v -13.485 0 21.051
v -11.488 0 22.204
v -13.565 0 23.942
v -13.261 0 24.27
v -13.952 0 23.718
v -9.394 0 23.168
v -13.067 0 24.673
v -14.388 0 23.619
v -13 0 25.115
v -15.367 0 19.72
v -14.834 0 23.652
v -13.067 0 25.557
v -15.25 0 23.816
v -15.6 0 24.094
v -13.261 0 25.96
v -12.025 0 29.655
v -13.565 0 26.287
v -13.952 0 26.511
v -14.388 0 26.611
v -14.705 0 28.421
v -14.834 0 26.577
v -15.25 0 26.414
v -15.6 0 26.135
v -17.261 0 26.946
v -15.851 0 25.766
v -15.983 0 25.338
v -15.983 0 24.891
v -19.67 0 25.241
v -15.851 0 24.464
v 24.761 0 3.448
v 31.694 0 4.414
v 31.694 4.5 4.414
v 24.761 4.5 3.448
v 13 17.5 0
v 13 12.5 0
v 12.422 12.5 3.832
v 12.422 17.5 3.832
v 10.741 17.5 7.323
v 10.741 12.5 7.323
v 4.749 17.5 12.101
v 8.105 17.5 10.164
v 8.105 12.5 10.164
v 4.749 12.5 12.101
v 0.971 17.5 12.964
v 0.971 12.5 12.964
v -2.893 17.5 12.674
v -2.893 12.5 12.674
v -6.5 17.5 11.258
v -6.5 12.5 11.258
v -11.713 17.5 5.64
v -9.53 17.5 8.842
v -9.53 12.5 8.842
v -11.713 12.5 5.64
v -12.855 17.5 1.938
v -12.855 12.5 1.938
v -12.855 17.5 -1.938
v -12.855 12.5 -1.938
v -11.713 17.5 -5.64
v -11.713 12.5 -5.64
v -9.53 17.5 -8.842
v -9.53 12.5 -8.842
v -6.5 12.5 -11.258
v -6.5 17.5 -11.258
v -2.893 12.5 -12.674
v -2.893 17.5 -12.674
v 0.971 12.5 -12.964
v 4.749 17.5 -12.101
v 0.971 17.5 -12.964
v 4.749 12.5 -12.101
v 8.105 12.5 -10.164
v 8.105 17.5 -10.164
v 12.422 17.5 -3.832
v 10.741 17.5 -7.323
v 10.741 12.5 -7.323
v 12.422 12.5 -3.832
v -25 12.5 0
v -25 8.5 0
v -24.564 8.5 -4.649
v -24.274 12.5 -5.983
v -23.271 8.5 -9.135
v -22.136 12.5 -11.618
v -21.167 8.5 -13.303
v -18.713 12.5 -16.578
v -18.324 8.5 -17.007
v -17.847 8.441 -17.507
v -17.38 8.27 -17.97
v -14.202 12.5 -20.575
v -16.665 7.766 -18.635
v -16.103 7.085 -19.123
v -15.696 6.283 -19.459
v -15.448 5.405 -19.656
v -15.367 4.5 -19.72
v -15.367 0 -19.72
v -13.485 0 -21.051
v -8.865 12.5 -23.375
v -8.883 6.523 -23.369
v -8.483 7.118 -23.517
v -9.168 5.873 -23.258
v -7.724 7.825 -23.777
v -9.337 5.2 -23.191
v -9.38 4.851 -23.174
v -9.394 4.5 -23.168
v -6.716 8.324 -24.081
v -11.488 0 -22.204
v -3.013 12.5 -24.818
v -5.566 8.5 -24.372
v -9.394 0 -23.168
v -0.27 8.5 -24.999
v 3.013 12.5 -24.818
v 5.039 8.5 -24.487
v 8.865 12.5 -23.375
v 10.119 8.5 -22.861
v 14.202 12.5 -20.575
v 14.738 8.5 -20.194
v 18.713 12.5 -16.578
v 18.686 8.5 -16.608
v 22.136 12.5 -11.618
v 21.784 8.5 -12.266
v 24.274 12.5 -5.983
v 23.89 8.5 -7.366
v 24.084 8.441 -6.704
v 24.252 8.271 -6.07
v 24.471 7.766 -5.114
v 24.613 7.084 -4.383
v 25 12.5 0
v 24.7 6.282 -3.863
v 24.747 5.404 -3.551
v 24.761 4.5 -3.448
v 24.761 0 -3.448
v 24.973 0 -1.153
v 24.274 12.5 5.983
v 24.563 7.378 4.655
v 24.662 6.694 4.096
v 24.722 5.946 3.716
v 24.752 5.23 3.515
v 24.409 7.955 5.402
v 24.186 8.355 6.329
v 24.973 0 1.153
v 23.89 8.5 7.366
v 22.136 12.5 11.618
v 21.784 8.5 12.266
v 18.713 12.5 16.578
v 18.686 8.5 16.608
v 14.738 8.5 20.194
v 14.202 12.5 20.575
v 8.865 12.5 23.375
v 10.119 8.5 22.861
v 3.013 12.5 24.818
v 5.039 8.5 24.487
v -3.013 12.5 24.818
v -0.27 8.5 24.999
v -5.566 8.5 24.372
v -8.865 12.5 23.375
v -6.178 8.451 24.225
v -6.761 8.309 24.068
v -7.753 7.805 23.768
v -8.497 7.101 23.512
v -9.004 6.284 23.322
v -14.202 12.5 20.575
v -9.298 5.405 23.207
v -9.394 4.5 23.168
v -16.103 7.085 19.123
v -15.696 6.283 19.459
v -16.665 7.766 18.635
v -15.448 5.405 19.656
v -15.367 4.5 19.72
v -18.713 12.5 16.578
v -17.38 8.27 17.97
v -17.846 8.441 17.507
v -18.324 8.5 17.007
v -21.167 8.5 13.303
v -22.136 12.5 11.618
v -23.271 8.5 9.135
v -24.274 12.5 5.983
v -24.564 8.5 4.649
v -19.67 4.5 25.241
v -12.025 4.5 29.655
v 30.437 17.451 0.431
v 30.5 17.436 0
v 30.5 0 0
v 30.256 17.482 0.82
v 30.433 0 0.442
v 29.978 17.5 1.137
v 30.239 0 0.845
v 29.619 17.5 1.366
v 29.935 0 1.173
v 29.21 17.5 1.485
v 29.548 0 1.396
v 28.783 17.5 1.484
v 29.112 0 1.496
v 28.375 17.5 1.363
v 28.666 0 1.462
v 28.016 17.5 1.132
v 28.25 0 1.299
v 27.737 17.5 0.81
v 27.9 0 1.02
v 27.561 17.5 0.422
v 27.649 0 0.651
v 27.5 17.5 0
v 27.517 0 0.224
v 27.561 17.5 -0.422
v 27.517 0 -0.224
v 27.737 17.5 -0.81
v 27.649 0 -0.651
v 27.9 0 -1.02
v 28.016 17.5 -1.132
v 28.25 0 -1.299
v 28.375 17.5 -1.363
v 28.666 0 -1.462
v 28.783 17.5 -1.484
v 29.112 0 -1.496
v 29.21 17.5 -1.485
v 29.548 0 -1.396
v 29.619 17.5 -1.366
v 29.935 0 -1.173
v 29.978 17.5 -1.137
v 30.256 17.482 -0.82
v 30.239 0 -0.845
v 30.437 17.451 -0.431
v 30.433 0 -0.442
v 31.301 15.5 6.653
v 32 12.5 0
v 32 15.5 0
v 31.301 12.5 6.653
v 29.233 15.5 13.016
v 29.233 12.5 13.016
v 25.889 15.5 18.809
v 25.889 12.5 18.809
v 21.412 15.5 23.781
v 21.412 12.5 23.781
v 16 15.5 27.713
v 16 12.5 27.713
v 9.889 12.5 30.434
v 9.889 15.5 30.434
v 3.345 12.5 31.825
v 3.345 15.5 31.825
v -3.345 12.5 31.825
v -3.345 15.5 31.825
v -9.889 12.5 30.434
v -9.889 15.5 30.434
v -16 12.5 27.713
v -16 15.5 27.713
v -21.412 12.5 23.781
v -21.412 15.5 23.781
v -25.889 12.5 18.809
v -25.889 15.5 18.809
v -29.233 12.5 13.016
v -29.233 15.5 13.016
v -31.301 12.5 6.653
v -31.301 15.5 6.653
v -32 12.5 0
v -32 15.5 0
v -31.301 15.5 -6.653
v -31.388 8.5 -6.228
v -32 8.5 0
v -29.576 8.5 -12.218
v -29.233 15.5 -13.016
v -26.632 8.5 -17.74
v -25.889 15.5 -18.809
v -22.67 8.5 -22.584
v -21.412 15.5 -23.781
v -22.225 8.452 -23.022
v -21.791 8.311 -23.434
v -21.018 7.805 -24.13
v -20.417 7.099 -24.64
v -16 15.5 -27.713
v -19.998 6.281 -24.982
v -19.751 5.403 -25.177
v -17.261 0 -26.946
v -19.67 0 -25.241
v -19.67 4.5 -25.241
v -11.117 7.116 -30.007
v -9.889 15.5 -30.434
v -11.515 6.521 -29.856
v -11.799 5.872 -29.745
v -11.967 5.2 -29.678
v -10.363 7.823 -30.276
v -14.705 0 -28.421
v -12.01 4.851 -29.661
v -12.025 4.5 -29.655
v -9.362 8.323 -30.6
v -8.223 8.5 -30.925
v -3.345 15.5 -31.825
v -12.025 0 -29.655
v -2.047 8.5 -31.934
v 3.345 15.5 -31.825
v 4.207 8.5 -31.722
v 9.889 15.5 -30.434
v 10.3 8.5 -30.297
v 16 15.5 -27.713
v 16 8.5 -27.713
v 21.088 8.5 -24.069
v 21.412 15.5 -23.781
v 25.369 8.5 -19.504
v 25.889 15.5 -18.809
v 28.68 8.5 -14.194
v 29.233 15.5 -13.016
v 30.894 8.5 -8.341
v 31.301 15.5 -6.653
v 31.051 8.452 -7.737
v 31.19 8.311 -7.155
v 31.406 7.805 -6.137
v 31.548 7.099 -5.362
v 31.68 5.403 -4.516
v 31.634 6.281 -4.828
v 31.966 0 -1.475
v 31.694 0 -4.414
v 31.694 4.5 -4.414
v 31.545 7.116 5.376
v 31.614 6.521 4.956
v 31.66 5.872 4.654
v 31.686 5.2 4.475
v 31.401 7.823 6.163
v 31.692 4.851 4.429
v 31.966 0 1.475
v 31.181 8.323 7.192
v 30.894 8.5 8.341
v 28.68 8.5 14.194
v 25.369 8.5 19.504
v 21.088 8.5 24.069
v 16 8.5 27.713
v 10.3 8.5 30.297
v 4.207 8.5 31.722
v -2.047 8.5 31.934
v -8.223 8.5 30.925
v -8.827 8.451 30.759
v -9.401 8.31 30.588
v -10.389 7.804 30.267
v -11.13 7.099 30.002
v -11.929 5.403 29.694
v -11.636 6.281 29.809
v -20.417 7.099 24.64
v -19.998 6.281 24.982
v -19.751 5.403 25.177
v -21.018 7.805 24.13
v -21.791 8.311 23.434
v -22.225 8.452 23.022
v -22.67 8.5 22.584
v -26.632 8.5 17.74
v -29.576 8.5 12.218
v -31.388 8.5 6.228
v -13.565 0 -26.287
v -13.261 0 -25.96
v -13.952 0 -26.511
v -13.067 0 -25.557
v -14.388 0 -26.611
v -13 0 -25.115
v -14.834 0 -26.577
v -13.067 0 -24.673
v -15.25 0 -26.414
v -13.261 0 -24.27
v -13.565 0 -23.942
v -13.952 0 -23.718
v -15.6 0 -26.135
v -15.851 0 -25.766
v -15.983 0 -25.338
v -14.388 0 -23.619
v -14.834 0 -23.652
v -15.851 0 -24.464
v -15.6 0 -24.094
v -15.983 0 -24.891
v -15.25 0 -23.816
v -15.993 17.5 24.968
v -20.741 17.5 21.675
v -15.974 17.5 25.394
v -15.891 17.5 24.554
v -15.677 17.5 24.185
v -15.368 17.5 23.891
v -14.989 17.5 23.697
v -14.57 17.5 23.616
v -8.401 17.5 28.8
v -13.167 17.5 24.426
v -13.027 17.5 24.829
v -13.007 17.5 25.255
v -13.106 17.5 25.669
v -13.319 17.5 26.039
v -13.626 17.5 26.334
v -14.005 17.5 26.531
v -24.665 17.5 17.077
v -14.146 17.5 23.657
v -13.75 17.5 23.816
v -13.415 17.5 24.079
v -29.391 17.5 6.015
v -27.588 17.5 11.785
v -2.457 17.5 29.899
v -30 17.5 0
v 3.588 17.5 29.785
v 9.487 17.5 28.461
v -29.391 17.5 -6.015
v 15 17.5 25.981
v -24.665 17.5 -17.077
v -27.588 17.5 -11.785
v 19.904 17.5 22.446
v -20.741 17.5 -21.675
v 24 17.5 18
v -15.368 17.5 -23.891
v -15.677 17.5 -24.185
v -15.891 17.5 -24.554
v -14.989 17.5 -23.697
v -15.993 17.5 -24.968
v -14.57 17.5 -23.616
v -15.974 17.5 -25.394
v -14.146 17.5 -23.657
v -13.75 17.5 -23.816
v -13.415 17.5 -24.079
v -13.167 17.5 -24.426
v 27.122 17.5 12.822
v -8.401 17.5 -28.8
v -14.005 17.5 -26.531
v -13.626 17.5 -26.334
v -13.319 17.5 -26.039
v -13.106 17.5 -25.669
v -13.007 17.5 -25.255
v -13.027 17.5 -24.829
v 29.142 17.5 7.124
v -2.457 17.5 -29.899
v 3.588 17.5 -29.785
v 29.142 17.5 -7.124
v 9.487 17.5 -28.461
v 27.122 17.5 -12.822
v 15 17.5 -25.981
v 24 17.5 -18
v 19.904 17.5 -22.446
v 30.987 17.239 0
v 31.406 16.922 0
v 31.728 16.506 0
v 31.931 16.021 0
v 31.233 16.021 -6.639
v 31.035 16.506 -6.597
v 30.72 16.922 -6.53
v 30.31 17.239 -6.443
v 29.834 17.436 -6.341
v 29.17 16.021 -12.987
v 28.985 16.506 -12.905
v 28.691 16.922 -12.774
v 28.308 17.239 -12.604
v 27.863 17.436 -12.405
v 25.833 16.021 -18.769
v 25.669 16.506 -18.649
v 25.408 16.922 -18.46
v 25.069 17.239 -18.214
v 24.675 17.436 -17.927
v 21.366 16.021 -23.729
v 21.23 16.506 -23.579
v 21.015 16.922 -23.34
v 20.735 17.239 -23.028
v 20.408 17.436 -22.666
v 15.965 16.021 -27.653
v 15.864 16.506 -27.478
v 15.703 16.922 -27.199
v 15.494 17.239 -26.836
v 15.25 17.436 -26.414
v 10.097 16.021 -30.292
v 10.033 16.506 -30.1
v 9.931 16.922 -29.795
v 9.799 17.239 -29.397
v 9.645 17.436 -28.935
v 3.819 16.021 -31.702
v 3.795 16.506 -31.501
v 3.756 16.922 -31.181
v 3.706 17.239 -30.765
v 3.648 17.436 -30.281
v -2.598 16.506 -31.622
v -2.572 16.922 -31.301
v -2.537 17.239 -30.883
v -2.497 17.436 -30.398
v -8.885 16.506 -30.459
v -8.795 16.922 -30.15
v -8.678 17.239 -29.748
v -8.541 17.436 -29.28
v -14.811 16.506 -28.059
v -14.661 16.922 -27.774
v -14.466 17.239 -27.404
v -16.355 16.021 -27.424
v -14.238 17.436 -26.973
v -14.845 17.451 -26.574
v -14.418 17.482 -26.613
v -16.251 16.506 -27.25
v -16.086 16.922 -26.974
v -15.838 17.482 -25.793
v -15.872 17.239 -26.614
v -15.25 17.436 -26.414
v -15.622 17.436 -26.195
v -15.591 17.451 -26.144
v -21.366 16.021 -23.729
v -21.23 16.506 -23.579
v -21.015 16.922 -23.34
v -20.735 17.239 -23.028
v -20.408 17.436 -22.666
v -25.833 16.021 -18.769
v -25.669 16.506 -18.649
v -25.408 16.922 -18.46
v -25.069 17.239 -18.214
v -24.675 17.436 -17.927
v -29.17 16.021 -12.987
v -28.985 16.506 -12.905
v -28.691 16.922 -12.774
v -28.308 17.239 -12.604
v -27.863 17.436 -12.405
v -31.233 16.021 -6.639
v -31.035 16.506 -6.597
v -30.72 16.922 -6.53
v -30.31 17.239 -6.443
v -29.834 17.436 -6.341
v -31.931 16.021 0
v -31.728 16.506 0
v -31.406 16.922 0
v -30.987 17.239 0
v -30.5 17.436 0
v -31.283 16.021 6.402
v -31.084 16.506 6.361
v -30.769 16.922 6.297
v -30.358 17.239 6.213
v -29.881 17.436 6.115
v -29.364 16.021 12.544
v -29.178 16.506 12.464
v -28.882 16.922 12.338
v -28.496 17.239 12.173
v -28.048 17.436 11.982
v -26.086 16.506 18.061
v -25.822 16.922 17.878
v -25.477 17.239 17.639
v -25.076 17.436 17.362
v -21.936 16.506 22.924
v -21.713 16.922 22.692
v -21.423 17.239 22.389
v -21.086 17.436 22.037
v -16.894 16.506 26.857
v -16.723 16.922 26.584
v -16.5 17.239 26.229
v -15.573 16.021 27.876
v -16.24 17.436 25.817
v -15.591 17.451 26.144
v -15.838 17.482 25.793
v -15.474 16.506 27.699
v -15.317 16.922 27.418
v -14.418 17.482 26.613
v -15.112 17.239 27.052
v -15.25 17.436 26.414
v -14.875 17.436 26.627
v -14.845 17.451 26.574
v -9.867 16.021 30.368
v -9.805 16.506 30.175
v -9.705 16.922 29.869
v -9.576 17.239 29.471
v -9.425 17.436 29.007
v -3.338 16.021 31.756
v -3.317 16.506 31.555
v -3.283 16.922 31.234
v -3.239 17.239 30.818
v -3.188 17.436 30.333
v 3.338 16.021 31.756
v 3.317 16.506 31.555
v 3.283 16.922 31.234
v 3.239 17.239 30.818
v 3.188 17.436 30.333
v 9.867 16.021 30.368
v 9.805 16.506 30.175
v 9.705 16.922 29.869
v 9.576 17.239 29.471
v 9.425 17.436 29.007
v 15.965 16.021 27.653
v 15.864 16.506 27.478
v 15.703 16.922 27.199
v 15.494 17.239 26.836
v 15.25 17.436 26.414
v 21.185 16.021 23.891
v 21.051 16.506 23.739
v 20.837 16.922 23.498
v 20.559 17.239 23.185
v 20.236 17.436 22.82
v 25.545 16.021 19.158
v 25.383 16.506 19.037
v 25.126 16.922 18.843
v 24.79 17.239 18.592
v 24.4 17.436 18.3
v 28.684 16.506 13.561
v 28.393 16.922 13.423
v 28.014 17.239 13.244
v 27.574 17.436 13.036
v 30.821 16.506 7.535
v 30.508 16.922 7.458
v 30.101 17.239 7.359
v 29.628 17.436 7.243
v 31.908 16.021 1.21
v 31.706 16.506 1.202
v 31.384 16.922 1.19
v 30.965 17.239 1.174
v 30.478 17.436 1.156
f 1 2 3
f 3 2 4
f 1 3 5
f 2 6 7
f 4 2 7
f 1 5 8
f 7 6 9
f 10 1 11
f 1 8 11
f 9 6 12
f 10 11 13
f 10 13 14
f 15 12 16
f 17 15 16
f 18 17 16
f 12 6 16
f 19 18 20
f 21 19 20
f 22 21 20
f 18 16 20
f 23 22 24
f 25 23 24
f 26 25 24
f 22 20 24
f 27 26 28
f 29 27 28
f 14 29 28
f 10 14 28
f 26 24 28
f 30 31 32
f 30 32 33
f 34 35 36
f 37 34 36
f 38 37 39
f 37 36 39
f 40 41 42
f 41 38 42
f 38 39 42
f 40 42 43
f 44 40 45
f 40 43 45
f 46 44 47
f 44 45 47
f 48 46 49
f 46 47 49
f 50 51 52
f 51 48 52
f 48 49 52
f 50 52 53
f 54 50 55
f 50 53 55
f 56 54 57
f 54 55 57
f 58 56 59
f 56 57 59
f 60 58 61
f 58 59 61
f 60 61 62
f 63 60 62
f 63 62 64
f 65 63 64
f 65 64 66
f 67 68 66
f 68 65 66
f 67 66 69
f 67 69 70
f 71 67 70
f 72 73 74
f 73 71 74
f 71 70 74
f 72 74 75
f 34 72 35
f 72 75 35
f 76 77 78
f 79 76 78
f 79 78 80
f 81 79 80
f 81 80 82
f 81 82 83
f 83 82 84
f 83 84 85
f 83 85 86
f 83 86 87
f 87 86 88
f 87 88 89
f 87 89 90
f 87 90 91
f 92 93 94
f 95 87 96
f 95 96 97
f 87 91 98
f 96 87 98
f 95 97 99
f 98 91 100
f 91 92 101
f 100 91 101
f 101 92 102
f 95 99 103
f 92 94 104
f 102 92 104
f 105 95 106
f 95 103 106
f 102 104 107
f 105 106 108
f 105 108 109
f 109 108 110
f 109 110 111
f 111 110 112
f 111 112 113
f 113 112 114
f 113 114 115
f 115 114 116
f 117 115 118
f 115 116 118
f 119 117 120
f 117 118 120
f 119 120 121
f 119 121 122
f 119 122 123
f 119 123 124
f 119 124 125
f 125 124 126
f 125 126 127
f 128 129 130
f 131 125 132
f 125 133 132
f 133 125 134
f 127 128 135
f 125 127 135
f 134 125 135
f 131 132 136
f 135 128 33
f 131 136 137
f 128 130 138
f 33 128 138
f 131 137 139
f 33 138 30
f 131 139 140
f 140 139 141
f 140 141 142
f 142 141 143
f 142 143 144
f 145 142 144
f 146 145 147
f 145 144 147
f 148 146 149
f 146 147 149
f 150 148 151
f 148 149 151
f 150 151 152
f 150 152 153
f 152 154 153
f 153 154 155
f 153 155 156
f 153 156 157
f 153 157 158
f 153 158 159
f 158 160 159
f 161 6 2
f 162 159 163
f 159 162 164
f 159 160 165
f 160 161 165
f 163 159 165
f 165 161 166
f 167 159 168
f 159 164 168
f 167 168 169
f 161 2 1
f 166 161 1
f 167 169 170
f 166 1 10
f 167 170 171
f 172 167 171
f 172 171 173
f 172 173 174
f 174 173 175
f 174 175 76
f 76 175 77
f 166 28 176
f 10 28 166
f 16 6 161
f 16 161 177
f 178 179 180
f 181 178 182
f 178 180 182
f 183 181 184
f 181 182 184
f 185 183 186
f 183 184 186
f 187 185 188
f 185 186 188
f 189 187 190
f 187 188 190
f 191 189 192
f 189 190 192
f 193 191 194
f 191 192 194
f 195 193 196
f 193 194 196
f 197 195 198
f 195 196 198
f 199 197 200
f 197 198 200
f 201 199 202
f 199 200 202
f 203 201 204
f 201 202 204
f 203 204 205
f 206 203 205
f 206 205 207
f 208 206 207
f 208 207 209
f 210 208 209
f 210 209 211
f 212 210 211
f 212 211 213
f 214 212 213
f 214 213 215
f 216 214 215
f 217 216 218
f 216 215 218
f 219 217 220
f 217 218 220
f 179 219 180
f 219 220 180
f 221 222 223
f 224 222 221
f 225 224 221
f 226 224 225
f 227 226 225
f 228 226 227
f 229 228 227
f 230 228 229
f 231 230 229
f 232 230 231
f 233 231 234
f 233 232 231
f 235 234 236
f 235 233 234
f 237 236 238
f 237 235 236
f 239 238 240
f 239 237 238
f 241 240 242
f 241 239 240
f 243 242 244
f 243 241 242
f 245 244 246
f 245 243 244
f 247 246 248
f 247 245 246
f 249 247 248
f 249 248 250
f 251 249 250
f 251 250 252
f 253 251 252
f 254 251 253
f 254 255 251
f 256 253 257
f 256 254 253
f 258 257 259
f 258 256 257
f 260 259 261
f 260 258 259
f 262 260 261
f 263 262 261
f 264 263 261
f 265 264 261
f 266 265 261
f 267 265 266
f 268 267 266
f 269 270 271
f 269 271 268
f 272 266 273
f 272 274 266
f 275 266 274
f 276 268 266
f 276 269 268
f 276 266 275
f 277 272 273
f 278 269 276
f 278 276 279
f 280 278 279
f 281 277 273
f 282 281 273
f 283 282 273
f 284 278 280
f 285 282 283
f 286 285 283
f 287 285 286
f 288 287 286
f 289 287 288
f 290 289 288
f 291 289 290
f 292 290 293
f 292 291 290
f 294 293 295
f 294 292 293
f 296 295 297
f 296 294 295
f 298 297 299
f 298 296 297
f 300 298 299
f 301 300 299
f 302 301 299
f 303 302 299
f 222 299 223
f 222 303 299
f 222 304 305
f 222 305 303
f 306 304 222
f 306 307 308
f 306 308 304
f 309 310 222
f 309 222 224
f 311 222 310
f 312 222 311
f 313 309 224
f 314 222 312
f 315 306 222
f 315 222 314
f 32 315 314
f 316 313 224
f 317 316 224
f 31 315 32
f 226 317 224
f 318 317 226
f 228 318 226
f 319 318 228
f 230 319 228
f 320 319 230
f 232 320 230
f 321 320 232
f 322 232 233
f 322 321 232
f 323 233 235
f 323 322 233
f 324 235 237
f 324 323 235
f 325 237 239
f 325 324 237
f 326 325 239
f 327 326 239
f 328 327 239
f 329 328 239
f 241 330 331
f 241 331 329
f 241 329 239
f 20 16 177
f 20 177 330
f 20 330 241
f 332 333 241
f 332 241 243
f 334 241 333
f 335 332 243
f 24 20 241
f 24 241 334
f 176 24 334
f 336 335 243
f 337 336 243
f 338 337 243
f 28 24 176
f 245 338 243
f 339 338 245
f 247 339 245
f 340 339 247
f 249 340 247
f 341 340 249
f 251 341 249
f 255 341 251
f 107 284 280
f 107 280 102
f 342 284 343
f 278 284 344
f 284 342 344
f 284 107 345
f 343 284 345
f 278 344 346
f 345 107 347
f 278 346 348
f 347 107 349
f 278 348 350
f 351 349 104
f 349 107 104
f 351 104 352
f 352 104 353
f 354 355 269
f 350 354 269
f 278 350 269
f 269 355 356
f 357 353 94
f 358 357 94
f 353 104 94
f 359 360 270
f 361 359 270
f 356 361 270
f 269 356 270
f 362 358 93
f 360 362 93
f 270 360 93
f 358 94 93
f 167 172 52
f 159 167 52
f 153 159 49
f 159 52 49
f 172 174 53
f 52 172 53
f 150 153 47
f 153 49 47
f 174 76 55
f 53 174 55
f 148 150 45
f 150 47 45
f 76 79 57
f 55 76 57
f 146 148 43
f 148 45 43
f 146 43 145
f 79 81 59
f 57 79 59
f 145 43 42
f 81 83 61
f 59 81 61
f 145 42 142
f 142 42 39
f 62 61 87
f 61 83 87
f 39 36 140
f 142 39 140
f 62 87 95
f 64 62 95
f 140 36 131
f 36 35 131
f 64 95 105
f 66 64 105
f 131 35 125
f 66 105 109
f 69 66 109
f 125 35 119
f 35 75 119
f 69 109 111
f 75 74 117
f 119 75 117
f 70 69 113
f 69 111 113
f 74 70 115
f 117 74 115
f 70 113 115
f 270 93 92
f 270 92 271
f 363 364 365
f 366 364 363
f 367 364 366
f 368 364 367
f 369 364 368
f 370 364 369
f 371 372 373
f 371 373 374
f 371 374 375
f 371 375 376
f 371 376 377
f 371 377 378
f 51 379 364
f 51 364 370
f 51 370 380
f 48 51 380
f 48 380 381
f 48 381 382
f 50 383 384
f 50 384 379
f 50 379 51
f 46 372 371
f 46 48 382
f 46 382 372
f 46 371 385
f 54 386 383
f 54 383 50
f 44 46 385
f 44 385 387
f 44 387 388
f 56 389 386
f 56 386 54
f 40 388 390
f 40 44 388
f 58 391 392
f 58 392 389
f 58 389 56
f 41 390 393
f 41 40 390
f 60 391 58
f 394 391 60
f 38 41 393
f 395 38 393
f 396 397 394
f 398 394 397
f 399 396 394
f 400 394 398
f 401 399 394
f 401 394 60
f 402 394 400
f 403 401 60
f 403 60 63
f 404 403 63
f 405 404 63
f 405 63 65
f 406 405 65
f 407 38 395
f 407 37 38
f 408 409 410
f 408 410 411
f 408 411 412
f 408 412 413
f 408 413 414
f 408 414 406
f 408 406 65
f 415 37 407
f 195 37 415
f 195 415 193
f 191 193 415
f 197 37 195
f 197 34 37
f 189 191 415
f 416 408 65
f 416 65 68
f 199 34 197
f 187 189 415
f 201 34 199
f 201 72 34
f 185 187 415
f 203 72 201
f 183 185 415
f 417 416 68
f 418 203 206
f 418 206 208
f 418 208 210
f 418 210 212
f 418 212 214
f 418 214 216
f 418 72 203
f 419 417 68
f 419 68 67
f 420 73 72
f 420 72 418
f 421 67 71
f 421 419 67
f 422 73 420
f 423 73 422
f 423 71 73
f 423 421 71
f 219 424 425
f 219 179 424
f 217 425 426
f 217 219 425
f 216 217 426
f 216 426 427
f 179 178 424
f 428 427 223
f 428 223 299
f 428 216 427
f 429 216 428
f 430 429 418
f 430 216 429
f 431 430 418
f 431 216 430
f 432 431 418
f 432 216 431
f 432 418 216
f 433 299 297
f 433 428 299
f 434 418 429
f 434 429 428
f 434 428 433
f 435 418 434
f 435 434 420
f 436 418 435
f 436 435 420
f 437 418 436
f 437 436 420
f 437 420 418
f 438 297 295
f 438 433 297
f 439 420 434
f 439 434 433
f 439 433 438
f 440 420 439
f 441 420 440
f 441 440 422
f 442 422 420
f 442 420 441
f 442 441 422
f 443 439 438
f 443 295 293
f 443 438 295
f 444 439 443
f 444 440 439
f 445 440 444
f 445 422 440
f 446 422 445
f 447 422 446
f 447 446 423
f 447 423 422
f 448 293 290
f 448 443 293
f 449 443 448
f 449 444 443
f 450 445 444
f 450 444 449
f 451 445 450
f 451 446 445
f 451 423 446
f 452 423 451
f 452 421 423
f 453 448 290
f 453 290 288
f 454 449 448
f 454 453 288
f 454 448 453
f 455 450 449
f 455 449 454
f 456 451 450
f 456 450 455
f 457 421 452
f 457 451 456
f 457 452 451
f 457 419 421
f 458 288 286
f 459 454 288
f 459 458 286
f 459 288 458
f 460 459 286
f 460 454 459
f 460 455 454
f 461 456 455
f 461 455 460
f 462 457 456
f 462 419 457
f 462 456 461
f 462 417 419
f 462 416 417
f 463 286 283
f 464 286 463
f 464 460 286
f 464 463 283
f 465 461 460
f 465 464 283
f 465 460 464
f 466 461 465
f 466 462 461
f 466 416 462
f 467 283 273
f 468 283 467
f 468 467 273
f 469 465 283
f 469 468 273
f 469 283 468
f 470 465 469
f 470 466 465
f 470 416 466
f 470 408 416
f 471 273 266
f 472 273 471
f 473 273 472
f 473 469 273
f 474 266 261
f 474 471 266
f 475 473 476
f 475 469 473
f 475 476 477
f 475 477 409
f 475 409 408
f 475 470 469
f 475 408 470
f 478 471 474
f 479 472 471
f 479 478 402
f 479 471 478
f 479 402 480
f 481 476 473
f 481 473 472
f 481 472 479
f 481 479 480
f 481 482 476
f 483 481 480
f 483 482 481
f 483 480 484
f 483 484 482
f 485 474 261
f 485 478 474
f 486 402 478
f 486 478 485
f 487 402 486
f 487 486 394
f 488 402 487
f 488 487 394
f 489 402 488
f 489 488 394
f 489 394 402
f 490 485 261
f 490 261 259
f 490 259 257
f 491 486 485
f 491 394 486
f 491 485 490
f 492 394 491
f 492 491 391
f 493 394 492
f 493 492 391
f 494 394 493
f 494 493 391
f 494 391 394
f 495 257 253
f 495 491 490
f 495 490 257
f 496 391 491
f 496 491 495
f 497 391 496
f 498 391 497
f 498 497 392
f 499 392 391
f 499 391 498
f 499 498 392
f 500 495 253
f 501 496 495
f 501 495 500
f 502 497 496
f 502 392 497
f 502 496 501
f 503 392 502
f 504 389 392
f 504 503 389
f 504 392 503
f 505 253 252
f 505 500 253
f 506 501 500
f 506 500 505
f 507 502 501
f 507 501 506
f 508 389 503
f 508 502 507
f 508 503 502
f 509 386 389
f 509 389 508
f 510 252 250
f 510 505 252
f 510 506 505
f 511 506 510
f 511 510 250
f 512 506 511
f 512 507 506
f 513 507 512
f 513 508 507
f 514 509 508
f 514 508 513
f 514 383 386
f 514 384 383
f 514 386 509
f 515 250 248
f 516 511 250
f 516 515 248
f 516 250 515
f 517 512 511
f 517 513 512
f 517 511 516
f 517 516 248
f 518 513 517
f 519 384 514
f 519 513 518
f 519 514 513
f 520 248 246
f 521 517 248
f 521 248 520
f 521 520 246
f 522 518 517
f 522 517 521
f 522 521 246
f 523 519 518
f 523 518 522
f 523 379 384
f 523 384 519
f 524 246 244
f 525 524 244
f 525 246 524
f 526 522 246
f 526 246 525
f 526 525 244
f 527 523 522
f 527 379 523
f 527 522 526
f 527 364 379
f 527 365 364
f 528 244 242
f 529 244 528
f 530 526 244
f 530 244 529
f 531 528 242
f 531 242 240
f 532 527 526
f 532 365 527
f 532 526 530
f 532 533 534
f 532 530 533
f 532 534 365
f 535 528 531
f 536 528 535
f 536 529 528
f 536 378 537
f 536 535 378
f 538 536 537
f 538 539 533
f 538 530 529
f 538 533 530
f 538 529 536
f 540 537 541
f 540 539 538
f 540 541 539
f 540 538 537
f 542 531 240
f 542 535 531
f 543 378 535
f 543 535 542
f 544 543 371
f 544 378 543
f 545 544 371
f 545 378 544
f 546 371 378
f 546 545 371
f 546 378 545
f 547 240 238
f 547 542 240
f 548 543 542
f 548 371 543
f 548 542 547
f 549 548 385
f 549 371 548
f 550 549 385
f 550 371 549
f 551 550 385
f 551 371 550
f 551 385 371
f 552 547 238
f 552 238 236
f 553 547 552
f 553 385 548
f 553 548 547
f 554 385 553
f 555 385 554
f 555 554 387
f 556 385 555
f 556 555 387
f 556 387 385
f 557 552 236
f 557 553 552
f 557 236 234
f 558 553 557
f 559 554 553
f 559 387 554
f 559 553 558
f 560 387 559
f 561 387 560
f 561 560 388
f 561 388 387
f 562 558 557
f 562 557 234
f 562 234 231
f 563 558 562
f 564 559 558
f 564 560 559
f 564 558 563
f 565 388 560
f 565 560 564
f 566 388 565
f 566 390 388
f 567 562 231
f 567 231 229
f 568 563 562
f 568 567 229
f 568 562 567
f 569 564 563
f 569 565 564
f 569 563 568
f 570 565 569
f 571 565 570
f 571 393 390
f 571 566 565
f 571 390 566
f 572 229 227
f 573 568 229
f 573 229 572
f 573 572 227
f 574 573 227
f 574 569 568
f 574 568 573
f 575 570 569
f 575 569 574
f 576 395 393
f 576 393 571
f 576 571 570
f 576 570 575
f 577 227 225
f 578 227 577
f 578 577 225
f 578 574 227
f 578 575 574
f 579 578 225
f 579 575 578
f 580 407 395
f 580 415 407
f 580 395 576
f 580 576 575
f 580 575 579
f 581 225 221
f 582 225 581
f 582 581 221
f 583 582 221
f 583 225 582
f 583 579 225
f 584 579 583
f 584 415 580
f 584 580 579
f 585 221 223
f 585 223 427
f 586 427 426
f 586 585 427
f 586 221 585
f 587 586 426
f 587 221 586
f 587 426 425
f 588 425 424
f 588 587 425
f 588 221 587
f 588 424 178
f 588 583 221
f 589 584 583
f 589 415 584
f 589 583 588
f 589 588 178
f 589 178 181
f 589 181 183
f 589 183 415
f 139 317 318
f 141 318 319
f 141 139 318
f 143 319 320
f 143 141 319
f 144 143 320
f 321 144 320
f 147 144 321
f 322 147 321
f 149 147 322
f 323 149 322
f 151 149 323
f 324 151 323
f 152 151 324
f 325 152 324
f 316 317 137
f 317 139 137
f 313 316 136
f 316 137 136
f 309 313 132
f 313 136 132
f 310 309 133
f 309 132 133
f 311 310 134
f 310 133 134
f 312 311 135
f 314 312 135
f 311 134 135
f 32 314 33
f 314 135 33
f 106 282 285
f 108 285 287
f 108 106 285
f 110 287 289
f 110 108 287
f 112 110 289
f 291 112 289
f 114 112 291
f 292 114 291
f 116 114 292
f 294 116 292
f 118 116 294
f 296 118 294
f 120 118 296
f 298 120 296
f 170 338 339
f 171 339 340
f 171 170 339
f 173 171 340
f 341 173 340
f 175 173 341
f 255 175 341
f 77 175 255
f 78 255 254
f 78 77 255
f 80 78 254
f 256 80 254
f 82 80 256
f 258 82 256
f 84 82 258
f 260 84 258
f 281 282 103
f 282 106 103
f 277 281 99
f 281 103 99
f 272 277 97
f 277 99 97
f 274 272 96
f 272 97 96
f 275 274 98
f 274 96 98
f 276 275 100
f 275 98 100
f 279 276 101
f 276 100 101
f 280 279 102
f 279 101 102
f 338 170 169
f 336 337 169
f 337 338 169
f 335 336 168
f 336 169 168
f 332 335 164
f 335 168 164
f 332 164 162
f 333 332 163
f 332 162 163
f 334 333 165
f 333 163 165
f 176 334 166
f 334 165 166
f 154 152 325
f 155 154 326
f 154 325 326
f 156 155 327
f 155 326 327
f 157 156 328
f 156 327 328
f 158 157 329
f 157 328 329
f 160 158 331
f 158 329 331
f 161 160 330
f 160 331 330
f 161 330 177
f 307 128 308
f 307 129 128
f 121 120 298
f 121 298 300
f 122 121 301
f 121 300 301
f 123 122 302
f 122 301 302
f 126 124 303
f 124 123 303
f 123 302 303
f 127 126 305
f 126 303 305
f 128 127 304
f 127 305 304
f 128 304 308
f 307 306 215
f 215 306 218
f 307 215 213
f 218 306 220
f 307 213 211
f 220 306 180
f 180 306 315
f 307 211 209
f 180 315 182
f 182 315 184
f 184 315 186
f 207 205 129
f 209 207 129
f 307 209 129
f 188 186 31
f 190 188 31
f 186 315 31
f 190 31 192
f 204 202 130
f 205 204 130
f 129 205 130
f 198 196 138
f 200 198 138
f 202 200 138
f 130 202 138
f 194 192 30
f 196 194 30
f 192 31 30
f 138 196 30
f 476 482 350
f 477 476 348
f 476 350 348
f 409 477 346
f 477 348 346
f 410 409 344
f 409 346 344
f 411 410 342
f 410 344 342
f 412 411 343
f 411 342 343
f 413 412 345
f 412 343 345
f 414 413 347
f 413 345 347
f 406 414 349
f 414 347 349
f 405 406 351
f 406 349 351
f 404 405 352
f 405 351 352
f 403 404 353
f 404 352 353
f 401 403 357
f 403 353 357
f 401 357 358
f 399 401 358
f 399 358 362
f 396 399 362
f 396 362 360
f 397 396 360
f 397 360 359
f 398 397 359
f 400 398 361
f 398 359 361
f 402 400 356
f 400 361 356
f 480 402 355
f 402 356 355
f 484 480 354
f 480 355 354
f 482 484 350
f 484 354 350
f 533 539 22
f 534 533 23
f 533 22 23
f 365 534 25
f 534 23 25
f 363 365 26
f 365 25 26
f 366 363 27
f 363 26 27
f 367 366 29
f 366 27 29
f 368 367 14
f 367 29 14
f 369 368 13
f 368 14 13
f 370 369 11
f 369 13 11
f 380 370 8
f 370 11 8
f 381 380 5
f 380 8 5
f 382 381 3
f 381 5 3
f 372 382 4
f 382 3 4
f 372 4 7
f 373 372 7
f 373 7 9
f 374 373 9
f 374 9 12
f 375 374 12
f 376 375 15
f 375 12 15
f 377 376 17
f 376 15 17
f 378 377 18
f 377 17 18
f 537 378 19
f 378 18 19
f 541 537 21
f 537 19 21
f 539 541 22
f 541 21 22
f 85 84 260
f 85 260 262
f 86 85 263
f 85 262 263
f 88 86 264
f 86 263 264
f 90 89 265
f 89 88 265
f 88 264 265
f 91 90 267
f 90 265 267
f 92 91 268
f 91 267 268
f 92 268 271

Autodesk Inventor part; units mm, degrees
ref_plane "YZ Plane" through (0, 0, 0) normal (1, 0, 0) x (0, 1, 0)
ref_plane "XZ Plane" through (0, 0, 0) normal (0, 1, 0) x (-1, 0, 0)
ref_plane "XY Plane" through (0, 0, 0) normal (0, 0, 1) x (1, 0, 0)
sketch "Sketch1" plane through (0, 0, 0) normal (0, 1, 0) x (-1, 0, 0)
  circle A0 centre (0, 0) radius 25
  circle A1 centre (0, 0) radius 32
  dimension "d0" = 50
  dimension "d1" = 64
extrude "Extrusion1" add sketch "Sketch1" along normal blind 12.5
sketch "Sketch2" plane through (0, 12.5, 0) normal (0, 1, 0) x (1, 0, 0)
  circle A0 centre (0, 0) radius 13
  circle A1 centre (0, 0) radius 32
  dimension "d4" = 26
extrude "Extrusion2" add sketch "Sketch2" along normal blind 5
sketch "Sketch4" plane through (0, 0, 0) normal (0, -1, 0) x (1, 0, 0)
  circle A0 centre (29, 0) radius 1.5
  circle A1 centre (0, 0) radius 25 projected
  circle A2 centre (0, 0) radius 32 projected
  dimension "d7" = 3
  dimension "d9" = 29
extrude "Extrusion3" cut sketch "Sketch4" against normal through all contours A0
pattern_circular "Circular Pattern1" count 3 over 360 about axis through (0, 0, 0) along (0, 1, 0) of "Extrusion3"
sketch "Sketch5" plane through (0, 0, 0) normal (0, -1, 0) x (1, 0, 0)
  line L0 (0, 0) -> (36.6386, -5.1024)
  line L1 (36.6386, -5.1024) -> (37.4304, -25.9892)
  line L2 (37.4304, -25.9892) -> (-15.9101, -39.2371)
  circle A0 centre (0, 0) radius 32 projected
  line L3 (-15.9101, -39.2371) -> (0, 0)
  circle A1 centre (29, 0) radius 1.5 projected
  circle A2 centre (-14.5, -25.1147) radius 1.5 projected
  point P0 (-12.0246, -29.6548)
  point P1 (31.6941, -4.4138)
  dimension "d15" = 4
  dimension "d22" = 4
extrude "Extrusion4" cut sketch "Sketch5" against normal blind 8.5 contours L0 A0 L3 picked at (12.6104, -17.0364)
pattern_circular "Circular Pattern2" count 3 over 360 about axis through (0, 12.5, 0) along (0, 1, 0) of "Extrusion4"
fillet "Fillet1" radius 4 6 edges at (28.2276, 8.5, -3.931) (-10.7094, 8.5, -26.4113) (-17.5182, 8.5, -22.4803) (-17.5182, 8.5, 22.4803) (-10.7094, 8.5, 26.4113) (28.2276, 8.5, 3.931)
fillet "Fillet2" radius 2 1 edges at (-32, 17.5, 0)
properties part number "Engine retention"
